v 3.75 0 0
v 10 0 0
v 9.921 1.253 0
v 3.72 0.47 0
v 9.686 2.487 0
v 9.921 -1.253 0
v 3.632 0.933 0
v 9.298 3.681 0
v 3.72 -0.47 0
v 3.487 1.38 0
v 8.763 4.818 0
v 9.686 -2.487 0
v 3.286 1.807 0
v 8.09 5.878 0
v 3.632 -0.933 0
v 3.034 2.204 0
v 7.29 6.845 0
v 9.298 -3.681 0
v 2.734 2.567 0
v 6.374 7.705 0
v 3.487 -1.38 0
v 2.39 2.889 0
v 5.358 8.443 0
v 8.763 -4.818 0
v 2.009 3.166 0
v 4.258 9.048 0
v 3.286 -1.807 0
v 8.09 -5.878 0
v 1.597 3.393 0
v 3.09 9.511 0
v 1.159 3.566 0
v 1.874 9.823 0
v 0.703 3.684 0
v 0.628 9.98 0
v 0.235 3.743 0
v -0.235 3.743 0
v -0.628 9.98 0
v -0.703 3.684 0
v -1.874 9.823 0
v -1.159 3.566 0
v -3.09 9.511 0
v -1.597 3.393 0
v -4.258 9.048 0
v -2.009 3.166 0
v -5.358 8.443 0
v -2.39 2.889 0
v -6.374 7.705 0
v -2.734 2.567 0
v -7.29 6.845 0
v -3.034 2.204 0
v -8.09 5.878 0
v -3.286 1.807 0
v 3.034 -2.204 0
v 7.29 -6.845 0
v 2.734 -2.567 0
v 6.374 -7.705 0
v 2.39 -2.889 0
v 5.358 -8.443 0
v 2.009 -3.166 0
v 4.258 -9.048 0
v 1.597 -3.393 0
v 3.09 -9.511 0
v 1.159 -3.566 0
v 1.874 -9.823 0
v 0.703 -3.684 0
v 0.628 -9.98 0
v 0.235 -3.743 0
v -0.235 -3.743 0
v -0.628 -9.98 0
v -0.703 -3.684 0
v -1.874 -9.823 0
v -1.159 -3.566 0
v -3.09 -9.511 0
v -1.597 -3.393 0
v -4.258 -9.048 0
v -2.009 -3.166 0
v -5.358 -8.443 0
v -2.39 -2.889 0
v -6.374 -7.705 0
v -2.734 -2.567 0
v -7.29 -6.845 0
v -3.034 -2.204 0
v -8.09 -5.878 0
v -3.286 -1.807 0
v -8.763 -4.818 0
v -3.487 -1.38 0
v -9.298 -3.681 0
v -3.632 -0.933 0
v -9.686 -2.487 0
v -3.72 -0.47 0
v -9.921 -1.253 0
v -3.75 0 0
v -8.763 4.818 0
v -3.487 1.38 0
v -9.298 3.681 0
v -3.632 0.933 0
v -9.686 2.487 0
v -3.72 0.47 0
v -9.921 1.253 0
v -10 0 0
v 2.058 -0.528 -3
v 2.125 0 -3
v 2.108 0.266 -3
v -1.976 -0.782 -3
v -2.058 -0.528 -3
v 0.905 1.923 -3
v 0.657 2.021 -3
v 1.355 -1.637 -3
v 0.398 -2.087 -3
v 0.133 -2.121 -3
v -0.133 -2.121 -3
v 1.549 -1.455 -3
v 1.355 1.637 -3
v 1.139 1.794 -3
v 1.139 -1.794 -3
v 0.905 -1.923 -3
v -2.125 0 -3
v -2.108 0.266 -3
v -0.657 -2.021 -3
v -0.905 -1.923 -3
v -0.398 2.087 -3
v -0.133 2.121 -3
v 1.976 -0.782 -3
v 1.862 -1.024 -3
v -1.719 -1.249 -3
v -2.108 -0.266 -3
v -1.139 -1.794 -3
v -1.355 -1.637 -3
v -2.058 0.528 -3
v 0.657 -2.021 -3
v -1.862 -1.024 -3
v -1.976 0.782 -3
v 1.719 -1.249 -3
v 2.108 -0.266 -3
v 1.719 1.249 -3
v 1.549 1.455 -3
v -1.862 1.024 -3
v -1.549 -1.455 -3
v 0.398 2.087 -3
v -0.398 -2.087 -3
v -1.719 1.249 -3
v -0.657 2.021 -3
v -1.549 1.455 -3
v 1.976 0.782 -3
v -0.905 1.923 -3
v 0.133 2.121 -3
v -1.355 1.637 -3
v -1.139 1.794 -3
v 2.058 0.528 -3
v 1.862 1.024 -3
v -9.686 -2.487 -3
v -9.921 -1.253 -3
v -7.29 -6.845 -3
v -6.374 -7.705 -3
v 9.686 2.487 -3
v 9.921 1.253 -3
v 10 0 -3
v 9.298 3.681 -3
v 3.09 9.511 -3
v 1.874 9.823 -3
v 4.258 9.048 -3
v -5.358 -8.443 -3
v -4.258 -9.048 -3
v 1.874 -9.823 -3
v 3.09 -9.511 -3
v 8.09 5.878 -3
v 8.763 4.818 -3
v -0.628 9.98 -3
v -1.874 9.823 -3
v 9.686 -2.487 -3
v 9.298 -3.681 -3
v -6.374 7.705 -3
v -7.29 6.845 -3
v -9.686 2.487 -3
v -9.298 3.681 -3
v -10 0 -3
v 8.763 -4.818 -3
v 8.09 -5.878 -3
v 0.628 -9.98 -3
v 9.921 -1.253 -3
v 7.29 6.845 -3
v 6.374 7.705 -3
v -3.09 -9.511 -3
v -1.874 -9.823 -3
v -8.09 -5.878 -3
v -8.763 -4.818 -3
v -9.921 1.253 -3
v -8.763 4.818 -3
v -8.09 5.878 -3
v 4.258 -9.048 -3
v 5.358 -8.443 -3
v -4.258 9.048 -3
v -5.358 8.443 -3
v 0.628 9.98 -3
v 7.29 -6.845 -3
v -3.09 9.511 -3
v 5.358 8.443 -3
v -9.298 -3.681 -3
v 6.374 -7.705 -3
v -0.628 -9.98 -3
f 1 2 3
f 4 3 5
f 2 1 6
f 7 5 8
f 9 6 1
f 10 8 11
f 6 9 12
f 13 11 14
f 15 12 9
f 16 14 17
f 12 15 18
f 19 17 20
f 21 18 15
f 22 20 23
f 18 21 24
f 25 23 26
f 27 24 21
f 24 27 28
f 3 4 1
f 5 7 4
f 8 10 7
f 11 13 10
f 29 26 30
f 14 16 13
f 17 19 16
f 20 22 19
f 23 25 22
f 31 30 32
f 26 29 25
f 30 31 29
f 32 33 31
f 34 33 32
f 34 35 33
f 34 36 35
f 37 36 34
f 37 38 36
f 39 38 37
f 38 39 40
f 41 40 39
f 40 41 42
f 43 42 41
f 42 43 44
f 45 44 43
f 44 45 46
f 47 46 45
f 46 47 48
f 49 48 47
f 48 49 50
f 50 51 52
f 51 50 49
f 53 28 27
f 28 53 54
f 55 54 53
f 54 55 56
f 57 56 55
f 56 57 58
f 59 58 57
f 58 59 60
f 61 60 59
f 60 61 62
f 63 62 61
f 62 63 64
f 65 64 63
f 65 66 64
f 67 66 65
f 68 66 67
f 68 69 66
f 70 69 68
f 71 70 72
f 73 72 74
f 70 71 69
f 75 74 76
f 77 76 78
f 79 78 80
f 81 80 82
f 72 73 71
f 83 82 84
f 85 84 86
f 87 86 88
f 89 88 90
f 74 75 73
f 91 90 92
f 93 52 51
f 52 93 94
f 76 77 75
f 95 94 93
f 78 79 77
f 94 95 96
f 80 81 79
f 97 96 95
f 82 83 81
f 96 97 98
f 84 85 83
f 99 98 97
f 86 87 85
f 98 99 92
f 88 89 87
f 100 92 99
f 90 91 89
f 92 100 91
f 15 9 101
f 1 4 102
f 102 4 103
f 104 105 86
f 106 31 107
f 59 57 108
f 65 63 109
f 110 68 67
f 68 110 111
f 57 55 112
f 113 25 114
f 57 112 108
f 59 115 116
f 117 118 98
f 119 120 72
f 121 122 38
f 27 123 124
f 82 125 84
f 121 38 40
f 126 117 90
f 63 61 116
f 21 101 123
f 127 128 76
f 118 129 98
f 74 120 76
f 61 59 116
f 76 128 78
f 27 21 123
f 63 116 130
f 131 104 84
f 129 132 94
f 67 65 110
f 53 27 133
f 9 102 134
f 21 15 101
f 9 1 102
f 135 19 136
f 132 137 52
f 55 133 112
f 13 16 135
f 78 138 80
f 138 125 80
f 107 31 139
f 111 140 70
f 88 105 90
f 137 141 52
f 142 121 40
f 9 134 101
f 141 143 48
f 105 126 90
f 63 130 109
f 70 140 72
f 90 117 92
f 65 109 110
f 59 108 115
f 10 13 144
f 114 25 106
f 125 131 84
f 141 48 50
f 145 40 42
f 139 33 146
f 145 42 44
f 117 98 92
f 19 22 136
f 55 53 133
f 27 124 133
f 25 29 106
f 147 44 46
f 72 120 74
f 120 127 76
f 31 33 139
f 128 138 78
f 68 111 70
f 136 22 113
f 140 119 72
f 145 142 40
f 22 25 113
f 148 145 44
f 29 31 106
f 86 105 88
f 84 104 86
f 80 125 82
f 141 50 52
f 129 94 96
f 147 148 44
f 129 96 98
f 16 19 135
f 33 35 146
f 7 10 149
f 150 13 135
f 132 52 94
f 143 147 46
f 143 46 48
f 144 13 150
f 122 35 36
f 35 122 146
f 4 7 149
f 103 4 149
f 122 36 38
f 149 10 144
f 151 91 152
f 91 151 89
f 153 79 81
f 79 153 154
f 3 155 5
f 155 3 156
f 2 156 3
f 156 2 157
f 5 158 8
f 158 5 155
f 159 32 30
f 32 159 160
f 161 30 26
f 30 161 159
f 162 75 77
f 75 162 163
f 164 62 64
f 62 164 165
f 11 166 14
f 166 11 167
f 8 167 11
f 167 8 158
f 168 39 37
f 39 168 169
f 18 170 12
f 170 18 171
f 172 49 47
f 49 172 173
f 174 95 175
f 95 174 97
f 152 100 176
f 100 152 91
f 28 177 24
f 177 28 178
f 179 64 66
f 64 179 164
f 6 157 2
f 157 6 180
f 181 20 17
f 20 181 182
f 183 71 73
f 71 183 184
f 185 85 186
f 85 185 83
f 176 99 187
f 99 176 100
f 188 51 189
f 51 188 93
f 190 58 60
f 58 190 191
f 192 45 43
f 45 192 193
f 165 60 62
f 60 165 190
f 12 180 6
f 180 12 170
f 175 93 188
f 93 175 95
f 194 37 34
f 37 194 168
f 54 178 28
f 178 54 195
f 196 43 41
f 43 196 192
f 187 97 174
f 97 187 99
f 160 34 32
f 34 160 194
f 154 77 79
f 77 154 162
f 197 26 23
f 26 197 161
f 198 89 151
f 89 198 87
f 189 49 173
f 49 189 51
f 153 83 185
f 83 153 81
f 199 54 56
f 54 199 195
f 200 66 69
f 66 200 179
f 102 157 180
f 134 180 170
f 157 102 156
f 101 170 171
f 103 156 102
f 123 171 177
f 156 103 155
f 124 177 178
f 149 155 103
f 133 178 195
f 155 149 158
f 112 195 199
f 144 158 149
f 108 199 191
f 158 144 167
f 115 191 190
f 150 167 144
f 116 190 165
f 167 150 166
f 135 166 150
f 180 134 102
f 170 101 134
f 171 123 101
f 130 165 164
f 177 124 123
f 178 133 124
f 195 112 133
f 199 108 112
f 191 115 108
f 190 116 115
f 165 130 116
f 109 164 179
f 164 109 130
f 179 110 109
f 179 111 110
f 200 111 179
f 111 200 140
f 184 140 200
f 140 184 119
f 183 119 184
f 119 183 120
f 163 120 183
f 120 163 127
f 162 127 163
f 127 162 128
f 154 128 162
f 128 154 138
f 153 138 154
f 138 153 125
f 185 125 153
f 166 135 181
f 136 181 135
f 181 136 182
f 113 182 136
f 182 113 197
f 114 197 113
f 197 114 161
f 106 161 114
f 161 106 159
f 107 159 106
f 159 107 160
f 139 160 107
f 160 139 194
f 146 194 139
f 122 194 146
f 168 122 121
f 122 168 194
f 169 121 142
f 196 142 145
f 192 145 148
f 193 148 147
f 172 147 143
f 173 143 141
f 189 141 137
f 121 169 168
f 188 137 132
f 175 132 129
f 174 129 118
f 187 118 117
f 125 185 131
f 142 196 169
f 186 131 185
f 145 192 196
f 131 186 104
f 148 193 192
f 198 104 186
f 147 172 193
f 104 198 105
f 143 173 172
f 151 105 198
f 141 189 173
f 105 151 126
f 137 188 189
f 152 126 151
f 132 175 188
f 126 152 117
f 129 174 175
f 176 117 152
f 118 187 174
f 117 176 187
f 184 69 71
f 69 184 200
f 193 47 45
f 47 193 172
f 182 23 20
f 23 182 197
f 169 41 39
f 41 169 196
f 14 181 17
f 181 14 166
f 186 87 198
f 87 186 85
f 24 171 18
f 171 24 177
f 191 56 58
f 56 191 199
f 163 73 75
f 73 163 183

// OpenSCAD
$fn = 50;

difference() {
	union() {
		translate(v = [0, 0, -3.0]) {
			cylinder(h = 3, r = 10.0);
		}
	}
	union() {
		translate(v = [0, 0, 0]) {
			rotate(a = [0, 0, 0]) {
				difference() {
					union() {
						translate(v = [0, 0, -6.0]) {
							cylinder(h = 6, r = 2.0);
						}
						translate(v = [0, 0, -3]) {
							cylinder(h = 3, r1 = 2.125, r2 = 3.75);
						}
						translate(v = [0, 0, -6.0]) {
							cylinder(h = 6, r = 2.125);
						}
						translate(v = [0, 0, -6.0]) {
							cylinder(h = 6, r = 2.0);
						}
					}
					union();
				}
			}
		}
	}
}
